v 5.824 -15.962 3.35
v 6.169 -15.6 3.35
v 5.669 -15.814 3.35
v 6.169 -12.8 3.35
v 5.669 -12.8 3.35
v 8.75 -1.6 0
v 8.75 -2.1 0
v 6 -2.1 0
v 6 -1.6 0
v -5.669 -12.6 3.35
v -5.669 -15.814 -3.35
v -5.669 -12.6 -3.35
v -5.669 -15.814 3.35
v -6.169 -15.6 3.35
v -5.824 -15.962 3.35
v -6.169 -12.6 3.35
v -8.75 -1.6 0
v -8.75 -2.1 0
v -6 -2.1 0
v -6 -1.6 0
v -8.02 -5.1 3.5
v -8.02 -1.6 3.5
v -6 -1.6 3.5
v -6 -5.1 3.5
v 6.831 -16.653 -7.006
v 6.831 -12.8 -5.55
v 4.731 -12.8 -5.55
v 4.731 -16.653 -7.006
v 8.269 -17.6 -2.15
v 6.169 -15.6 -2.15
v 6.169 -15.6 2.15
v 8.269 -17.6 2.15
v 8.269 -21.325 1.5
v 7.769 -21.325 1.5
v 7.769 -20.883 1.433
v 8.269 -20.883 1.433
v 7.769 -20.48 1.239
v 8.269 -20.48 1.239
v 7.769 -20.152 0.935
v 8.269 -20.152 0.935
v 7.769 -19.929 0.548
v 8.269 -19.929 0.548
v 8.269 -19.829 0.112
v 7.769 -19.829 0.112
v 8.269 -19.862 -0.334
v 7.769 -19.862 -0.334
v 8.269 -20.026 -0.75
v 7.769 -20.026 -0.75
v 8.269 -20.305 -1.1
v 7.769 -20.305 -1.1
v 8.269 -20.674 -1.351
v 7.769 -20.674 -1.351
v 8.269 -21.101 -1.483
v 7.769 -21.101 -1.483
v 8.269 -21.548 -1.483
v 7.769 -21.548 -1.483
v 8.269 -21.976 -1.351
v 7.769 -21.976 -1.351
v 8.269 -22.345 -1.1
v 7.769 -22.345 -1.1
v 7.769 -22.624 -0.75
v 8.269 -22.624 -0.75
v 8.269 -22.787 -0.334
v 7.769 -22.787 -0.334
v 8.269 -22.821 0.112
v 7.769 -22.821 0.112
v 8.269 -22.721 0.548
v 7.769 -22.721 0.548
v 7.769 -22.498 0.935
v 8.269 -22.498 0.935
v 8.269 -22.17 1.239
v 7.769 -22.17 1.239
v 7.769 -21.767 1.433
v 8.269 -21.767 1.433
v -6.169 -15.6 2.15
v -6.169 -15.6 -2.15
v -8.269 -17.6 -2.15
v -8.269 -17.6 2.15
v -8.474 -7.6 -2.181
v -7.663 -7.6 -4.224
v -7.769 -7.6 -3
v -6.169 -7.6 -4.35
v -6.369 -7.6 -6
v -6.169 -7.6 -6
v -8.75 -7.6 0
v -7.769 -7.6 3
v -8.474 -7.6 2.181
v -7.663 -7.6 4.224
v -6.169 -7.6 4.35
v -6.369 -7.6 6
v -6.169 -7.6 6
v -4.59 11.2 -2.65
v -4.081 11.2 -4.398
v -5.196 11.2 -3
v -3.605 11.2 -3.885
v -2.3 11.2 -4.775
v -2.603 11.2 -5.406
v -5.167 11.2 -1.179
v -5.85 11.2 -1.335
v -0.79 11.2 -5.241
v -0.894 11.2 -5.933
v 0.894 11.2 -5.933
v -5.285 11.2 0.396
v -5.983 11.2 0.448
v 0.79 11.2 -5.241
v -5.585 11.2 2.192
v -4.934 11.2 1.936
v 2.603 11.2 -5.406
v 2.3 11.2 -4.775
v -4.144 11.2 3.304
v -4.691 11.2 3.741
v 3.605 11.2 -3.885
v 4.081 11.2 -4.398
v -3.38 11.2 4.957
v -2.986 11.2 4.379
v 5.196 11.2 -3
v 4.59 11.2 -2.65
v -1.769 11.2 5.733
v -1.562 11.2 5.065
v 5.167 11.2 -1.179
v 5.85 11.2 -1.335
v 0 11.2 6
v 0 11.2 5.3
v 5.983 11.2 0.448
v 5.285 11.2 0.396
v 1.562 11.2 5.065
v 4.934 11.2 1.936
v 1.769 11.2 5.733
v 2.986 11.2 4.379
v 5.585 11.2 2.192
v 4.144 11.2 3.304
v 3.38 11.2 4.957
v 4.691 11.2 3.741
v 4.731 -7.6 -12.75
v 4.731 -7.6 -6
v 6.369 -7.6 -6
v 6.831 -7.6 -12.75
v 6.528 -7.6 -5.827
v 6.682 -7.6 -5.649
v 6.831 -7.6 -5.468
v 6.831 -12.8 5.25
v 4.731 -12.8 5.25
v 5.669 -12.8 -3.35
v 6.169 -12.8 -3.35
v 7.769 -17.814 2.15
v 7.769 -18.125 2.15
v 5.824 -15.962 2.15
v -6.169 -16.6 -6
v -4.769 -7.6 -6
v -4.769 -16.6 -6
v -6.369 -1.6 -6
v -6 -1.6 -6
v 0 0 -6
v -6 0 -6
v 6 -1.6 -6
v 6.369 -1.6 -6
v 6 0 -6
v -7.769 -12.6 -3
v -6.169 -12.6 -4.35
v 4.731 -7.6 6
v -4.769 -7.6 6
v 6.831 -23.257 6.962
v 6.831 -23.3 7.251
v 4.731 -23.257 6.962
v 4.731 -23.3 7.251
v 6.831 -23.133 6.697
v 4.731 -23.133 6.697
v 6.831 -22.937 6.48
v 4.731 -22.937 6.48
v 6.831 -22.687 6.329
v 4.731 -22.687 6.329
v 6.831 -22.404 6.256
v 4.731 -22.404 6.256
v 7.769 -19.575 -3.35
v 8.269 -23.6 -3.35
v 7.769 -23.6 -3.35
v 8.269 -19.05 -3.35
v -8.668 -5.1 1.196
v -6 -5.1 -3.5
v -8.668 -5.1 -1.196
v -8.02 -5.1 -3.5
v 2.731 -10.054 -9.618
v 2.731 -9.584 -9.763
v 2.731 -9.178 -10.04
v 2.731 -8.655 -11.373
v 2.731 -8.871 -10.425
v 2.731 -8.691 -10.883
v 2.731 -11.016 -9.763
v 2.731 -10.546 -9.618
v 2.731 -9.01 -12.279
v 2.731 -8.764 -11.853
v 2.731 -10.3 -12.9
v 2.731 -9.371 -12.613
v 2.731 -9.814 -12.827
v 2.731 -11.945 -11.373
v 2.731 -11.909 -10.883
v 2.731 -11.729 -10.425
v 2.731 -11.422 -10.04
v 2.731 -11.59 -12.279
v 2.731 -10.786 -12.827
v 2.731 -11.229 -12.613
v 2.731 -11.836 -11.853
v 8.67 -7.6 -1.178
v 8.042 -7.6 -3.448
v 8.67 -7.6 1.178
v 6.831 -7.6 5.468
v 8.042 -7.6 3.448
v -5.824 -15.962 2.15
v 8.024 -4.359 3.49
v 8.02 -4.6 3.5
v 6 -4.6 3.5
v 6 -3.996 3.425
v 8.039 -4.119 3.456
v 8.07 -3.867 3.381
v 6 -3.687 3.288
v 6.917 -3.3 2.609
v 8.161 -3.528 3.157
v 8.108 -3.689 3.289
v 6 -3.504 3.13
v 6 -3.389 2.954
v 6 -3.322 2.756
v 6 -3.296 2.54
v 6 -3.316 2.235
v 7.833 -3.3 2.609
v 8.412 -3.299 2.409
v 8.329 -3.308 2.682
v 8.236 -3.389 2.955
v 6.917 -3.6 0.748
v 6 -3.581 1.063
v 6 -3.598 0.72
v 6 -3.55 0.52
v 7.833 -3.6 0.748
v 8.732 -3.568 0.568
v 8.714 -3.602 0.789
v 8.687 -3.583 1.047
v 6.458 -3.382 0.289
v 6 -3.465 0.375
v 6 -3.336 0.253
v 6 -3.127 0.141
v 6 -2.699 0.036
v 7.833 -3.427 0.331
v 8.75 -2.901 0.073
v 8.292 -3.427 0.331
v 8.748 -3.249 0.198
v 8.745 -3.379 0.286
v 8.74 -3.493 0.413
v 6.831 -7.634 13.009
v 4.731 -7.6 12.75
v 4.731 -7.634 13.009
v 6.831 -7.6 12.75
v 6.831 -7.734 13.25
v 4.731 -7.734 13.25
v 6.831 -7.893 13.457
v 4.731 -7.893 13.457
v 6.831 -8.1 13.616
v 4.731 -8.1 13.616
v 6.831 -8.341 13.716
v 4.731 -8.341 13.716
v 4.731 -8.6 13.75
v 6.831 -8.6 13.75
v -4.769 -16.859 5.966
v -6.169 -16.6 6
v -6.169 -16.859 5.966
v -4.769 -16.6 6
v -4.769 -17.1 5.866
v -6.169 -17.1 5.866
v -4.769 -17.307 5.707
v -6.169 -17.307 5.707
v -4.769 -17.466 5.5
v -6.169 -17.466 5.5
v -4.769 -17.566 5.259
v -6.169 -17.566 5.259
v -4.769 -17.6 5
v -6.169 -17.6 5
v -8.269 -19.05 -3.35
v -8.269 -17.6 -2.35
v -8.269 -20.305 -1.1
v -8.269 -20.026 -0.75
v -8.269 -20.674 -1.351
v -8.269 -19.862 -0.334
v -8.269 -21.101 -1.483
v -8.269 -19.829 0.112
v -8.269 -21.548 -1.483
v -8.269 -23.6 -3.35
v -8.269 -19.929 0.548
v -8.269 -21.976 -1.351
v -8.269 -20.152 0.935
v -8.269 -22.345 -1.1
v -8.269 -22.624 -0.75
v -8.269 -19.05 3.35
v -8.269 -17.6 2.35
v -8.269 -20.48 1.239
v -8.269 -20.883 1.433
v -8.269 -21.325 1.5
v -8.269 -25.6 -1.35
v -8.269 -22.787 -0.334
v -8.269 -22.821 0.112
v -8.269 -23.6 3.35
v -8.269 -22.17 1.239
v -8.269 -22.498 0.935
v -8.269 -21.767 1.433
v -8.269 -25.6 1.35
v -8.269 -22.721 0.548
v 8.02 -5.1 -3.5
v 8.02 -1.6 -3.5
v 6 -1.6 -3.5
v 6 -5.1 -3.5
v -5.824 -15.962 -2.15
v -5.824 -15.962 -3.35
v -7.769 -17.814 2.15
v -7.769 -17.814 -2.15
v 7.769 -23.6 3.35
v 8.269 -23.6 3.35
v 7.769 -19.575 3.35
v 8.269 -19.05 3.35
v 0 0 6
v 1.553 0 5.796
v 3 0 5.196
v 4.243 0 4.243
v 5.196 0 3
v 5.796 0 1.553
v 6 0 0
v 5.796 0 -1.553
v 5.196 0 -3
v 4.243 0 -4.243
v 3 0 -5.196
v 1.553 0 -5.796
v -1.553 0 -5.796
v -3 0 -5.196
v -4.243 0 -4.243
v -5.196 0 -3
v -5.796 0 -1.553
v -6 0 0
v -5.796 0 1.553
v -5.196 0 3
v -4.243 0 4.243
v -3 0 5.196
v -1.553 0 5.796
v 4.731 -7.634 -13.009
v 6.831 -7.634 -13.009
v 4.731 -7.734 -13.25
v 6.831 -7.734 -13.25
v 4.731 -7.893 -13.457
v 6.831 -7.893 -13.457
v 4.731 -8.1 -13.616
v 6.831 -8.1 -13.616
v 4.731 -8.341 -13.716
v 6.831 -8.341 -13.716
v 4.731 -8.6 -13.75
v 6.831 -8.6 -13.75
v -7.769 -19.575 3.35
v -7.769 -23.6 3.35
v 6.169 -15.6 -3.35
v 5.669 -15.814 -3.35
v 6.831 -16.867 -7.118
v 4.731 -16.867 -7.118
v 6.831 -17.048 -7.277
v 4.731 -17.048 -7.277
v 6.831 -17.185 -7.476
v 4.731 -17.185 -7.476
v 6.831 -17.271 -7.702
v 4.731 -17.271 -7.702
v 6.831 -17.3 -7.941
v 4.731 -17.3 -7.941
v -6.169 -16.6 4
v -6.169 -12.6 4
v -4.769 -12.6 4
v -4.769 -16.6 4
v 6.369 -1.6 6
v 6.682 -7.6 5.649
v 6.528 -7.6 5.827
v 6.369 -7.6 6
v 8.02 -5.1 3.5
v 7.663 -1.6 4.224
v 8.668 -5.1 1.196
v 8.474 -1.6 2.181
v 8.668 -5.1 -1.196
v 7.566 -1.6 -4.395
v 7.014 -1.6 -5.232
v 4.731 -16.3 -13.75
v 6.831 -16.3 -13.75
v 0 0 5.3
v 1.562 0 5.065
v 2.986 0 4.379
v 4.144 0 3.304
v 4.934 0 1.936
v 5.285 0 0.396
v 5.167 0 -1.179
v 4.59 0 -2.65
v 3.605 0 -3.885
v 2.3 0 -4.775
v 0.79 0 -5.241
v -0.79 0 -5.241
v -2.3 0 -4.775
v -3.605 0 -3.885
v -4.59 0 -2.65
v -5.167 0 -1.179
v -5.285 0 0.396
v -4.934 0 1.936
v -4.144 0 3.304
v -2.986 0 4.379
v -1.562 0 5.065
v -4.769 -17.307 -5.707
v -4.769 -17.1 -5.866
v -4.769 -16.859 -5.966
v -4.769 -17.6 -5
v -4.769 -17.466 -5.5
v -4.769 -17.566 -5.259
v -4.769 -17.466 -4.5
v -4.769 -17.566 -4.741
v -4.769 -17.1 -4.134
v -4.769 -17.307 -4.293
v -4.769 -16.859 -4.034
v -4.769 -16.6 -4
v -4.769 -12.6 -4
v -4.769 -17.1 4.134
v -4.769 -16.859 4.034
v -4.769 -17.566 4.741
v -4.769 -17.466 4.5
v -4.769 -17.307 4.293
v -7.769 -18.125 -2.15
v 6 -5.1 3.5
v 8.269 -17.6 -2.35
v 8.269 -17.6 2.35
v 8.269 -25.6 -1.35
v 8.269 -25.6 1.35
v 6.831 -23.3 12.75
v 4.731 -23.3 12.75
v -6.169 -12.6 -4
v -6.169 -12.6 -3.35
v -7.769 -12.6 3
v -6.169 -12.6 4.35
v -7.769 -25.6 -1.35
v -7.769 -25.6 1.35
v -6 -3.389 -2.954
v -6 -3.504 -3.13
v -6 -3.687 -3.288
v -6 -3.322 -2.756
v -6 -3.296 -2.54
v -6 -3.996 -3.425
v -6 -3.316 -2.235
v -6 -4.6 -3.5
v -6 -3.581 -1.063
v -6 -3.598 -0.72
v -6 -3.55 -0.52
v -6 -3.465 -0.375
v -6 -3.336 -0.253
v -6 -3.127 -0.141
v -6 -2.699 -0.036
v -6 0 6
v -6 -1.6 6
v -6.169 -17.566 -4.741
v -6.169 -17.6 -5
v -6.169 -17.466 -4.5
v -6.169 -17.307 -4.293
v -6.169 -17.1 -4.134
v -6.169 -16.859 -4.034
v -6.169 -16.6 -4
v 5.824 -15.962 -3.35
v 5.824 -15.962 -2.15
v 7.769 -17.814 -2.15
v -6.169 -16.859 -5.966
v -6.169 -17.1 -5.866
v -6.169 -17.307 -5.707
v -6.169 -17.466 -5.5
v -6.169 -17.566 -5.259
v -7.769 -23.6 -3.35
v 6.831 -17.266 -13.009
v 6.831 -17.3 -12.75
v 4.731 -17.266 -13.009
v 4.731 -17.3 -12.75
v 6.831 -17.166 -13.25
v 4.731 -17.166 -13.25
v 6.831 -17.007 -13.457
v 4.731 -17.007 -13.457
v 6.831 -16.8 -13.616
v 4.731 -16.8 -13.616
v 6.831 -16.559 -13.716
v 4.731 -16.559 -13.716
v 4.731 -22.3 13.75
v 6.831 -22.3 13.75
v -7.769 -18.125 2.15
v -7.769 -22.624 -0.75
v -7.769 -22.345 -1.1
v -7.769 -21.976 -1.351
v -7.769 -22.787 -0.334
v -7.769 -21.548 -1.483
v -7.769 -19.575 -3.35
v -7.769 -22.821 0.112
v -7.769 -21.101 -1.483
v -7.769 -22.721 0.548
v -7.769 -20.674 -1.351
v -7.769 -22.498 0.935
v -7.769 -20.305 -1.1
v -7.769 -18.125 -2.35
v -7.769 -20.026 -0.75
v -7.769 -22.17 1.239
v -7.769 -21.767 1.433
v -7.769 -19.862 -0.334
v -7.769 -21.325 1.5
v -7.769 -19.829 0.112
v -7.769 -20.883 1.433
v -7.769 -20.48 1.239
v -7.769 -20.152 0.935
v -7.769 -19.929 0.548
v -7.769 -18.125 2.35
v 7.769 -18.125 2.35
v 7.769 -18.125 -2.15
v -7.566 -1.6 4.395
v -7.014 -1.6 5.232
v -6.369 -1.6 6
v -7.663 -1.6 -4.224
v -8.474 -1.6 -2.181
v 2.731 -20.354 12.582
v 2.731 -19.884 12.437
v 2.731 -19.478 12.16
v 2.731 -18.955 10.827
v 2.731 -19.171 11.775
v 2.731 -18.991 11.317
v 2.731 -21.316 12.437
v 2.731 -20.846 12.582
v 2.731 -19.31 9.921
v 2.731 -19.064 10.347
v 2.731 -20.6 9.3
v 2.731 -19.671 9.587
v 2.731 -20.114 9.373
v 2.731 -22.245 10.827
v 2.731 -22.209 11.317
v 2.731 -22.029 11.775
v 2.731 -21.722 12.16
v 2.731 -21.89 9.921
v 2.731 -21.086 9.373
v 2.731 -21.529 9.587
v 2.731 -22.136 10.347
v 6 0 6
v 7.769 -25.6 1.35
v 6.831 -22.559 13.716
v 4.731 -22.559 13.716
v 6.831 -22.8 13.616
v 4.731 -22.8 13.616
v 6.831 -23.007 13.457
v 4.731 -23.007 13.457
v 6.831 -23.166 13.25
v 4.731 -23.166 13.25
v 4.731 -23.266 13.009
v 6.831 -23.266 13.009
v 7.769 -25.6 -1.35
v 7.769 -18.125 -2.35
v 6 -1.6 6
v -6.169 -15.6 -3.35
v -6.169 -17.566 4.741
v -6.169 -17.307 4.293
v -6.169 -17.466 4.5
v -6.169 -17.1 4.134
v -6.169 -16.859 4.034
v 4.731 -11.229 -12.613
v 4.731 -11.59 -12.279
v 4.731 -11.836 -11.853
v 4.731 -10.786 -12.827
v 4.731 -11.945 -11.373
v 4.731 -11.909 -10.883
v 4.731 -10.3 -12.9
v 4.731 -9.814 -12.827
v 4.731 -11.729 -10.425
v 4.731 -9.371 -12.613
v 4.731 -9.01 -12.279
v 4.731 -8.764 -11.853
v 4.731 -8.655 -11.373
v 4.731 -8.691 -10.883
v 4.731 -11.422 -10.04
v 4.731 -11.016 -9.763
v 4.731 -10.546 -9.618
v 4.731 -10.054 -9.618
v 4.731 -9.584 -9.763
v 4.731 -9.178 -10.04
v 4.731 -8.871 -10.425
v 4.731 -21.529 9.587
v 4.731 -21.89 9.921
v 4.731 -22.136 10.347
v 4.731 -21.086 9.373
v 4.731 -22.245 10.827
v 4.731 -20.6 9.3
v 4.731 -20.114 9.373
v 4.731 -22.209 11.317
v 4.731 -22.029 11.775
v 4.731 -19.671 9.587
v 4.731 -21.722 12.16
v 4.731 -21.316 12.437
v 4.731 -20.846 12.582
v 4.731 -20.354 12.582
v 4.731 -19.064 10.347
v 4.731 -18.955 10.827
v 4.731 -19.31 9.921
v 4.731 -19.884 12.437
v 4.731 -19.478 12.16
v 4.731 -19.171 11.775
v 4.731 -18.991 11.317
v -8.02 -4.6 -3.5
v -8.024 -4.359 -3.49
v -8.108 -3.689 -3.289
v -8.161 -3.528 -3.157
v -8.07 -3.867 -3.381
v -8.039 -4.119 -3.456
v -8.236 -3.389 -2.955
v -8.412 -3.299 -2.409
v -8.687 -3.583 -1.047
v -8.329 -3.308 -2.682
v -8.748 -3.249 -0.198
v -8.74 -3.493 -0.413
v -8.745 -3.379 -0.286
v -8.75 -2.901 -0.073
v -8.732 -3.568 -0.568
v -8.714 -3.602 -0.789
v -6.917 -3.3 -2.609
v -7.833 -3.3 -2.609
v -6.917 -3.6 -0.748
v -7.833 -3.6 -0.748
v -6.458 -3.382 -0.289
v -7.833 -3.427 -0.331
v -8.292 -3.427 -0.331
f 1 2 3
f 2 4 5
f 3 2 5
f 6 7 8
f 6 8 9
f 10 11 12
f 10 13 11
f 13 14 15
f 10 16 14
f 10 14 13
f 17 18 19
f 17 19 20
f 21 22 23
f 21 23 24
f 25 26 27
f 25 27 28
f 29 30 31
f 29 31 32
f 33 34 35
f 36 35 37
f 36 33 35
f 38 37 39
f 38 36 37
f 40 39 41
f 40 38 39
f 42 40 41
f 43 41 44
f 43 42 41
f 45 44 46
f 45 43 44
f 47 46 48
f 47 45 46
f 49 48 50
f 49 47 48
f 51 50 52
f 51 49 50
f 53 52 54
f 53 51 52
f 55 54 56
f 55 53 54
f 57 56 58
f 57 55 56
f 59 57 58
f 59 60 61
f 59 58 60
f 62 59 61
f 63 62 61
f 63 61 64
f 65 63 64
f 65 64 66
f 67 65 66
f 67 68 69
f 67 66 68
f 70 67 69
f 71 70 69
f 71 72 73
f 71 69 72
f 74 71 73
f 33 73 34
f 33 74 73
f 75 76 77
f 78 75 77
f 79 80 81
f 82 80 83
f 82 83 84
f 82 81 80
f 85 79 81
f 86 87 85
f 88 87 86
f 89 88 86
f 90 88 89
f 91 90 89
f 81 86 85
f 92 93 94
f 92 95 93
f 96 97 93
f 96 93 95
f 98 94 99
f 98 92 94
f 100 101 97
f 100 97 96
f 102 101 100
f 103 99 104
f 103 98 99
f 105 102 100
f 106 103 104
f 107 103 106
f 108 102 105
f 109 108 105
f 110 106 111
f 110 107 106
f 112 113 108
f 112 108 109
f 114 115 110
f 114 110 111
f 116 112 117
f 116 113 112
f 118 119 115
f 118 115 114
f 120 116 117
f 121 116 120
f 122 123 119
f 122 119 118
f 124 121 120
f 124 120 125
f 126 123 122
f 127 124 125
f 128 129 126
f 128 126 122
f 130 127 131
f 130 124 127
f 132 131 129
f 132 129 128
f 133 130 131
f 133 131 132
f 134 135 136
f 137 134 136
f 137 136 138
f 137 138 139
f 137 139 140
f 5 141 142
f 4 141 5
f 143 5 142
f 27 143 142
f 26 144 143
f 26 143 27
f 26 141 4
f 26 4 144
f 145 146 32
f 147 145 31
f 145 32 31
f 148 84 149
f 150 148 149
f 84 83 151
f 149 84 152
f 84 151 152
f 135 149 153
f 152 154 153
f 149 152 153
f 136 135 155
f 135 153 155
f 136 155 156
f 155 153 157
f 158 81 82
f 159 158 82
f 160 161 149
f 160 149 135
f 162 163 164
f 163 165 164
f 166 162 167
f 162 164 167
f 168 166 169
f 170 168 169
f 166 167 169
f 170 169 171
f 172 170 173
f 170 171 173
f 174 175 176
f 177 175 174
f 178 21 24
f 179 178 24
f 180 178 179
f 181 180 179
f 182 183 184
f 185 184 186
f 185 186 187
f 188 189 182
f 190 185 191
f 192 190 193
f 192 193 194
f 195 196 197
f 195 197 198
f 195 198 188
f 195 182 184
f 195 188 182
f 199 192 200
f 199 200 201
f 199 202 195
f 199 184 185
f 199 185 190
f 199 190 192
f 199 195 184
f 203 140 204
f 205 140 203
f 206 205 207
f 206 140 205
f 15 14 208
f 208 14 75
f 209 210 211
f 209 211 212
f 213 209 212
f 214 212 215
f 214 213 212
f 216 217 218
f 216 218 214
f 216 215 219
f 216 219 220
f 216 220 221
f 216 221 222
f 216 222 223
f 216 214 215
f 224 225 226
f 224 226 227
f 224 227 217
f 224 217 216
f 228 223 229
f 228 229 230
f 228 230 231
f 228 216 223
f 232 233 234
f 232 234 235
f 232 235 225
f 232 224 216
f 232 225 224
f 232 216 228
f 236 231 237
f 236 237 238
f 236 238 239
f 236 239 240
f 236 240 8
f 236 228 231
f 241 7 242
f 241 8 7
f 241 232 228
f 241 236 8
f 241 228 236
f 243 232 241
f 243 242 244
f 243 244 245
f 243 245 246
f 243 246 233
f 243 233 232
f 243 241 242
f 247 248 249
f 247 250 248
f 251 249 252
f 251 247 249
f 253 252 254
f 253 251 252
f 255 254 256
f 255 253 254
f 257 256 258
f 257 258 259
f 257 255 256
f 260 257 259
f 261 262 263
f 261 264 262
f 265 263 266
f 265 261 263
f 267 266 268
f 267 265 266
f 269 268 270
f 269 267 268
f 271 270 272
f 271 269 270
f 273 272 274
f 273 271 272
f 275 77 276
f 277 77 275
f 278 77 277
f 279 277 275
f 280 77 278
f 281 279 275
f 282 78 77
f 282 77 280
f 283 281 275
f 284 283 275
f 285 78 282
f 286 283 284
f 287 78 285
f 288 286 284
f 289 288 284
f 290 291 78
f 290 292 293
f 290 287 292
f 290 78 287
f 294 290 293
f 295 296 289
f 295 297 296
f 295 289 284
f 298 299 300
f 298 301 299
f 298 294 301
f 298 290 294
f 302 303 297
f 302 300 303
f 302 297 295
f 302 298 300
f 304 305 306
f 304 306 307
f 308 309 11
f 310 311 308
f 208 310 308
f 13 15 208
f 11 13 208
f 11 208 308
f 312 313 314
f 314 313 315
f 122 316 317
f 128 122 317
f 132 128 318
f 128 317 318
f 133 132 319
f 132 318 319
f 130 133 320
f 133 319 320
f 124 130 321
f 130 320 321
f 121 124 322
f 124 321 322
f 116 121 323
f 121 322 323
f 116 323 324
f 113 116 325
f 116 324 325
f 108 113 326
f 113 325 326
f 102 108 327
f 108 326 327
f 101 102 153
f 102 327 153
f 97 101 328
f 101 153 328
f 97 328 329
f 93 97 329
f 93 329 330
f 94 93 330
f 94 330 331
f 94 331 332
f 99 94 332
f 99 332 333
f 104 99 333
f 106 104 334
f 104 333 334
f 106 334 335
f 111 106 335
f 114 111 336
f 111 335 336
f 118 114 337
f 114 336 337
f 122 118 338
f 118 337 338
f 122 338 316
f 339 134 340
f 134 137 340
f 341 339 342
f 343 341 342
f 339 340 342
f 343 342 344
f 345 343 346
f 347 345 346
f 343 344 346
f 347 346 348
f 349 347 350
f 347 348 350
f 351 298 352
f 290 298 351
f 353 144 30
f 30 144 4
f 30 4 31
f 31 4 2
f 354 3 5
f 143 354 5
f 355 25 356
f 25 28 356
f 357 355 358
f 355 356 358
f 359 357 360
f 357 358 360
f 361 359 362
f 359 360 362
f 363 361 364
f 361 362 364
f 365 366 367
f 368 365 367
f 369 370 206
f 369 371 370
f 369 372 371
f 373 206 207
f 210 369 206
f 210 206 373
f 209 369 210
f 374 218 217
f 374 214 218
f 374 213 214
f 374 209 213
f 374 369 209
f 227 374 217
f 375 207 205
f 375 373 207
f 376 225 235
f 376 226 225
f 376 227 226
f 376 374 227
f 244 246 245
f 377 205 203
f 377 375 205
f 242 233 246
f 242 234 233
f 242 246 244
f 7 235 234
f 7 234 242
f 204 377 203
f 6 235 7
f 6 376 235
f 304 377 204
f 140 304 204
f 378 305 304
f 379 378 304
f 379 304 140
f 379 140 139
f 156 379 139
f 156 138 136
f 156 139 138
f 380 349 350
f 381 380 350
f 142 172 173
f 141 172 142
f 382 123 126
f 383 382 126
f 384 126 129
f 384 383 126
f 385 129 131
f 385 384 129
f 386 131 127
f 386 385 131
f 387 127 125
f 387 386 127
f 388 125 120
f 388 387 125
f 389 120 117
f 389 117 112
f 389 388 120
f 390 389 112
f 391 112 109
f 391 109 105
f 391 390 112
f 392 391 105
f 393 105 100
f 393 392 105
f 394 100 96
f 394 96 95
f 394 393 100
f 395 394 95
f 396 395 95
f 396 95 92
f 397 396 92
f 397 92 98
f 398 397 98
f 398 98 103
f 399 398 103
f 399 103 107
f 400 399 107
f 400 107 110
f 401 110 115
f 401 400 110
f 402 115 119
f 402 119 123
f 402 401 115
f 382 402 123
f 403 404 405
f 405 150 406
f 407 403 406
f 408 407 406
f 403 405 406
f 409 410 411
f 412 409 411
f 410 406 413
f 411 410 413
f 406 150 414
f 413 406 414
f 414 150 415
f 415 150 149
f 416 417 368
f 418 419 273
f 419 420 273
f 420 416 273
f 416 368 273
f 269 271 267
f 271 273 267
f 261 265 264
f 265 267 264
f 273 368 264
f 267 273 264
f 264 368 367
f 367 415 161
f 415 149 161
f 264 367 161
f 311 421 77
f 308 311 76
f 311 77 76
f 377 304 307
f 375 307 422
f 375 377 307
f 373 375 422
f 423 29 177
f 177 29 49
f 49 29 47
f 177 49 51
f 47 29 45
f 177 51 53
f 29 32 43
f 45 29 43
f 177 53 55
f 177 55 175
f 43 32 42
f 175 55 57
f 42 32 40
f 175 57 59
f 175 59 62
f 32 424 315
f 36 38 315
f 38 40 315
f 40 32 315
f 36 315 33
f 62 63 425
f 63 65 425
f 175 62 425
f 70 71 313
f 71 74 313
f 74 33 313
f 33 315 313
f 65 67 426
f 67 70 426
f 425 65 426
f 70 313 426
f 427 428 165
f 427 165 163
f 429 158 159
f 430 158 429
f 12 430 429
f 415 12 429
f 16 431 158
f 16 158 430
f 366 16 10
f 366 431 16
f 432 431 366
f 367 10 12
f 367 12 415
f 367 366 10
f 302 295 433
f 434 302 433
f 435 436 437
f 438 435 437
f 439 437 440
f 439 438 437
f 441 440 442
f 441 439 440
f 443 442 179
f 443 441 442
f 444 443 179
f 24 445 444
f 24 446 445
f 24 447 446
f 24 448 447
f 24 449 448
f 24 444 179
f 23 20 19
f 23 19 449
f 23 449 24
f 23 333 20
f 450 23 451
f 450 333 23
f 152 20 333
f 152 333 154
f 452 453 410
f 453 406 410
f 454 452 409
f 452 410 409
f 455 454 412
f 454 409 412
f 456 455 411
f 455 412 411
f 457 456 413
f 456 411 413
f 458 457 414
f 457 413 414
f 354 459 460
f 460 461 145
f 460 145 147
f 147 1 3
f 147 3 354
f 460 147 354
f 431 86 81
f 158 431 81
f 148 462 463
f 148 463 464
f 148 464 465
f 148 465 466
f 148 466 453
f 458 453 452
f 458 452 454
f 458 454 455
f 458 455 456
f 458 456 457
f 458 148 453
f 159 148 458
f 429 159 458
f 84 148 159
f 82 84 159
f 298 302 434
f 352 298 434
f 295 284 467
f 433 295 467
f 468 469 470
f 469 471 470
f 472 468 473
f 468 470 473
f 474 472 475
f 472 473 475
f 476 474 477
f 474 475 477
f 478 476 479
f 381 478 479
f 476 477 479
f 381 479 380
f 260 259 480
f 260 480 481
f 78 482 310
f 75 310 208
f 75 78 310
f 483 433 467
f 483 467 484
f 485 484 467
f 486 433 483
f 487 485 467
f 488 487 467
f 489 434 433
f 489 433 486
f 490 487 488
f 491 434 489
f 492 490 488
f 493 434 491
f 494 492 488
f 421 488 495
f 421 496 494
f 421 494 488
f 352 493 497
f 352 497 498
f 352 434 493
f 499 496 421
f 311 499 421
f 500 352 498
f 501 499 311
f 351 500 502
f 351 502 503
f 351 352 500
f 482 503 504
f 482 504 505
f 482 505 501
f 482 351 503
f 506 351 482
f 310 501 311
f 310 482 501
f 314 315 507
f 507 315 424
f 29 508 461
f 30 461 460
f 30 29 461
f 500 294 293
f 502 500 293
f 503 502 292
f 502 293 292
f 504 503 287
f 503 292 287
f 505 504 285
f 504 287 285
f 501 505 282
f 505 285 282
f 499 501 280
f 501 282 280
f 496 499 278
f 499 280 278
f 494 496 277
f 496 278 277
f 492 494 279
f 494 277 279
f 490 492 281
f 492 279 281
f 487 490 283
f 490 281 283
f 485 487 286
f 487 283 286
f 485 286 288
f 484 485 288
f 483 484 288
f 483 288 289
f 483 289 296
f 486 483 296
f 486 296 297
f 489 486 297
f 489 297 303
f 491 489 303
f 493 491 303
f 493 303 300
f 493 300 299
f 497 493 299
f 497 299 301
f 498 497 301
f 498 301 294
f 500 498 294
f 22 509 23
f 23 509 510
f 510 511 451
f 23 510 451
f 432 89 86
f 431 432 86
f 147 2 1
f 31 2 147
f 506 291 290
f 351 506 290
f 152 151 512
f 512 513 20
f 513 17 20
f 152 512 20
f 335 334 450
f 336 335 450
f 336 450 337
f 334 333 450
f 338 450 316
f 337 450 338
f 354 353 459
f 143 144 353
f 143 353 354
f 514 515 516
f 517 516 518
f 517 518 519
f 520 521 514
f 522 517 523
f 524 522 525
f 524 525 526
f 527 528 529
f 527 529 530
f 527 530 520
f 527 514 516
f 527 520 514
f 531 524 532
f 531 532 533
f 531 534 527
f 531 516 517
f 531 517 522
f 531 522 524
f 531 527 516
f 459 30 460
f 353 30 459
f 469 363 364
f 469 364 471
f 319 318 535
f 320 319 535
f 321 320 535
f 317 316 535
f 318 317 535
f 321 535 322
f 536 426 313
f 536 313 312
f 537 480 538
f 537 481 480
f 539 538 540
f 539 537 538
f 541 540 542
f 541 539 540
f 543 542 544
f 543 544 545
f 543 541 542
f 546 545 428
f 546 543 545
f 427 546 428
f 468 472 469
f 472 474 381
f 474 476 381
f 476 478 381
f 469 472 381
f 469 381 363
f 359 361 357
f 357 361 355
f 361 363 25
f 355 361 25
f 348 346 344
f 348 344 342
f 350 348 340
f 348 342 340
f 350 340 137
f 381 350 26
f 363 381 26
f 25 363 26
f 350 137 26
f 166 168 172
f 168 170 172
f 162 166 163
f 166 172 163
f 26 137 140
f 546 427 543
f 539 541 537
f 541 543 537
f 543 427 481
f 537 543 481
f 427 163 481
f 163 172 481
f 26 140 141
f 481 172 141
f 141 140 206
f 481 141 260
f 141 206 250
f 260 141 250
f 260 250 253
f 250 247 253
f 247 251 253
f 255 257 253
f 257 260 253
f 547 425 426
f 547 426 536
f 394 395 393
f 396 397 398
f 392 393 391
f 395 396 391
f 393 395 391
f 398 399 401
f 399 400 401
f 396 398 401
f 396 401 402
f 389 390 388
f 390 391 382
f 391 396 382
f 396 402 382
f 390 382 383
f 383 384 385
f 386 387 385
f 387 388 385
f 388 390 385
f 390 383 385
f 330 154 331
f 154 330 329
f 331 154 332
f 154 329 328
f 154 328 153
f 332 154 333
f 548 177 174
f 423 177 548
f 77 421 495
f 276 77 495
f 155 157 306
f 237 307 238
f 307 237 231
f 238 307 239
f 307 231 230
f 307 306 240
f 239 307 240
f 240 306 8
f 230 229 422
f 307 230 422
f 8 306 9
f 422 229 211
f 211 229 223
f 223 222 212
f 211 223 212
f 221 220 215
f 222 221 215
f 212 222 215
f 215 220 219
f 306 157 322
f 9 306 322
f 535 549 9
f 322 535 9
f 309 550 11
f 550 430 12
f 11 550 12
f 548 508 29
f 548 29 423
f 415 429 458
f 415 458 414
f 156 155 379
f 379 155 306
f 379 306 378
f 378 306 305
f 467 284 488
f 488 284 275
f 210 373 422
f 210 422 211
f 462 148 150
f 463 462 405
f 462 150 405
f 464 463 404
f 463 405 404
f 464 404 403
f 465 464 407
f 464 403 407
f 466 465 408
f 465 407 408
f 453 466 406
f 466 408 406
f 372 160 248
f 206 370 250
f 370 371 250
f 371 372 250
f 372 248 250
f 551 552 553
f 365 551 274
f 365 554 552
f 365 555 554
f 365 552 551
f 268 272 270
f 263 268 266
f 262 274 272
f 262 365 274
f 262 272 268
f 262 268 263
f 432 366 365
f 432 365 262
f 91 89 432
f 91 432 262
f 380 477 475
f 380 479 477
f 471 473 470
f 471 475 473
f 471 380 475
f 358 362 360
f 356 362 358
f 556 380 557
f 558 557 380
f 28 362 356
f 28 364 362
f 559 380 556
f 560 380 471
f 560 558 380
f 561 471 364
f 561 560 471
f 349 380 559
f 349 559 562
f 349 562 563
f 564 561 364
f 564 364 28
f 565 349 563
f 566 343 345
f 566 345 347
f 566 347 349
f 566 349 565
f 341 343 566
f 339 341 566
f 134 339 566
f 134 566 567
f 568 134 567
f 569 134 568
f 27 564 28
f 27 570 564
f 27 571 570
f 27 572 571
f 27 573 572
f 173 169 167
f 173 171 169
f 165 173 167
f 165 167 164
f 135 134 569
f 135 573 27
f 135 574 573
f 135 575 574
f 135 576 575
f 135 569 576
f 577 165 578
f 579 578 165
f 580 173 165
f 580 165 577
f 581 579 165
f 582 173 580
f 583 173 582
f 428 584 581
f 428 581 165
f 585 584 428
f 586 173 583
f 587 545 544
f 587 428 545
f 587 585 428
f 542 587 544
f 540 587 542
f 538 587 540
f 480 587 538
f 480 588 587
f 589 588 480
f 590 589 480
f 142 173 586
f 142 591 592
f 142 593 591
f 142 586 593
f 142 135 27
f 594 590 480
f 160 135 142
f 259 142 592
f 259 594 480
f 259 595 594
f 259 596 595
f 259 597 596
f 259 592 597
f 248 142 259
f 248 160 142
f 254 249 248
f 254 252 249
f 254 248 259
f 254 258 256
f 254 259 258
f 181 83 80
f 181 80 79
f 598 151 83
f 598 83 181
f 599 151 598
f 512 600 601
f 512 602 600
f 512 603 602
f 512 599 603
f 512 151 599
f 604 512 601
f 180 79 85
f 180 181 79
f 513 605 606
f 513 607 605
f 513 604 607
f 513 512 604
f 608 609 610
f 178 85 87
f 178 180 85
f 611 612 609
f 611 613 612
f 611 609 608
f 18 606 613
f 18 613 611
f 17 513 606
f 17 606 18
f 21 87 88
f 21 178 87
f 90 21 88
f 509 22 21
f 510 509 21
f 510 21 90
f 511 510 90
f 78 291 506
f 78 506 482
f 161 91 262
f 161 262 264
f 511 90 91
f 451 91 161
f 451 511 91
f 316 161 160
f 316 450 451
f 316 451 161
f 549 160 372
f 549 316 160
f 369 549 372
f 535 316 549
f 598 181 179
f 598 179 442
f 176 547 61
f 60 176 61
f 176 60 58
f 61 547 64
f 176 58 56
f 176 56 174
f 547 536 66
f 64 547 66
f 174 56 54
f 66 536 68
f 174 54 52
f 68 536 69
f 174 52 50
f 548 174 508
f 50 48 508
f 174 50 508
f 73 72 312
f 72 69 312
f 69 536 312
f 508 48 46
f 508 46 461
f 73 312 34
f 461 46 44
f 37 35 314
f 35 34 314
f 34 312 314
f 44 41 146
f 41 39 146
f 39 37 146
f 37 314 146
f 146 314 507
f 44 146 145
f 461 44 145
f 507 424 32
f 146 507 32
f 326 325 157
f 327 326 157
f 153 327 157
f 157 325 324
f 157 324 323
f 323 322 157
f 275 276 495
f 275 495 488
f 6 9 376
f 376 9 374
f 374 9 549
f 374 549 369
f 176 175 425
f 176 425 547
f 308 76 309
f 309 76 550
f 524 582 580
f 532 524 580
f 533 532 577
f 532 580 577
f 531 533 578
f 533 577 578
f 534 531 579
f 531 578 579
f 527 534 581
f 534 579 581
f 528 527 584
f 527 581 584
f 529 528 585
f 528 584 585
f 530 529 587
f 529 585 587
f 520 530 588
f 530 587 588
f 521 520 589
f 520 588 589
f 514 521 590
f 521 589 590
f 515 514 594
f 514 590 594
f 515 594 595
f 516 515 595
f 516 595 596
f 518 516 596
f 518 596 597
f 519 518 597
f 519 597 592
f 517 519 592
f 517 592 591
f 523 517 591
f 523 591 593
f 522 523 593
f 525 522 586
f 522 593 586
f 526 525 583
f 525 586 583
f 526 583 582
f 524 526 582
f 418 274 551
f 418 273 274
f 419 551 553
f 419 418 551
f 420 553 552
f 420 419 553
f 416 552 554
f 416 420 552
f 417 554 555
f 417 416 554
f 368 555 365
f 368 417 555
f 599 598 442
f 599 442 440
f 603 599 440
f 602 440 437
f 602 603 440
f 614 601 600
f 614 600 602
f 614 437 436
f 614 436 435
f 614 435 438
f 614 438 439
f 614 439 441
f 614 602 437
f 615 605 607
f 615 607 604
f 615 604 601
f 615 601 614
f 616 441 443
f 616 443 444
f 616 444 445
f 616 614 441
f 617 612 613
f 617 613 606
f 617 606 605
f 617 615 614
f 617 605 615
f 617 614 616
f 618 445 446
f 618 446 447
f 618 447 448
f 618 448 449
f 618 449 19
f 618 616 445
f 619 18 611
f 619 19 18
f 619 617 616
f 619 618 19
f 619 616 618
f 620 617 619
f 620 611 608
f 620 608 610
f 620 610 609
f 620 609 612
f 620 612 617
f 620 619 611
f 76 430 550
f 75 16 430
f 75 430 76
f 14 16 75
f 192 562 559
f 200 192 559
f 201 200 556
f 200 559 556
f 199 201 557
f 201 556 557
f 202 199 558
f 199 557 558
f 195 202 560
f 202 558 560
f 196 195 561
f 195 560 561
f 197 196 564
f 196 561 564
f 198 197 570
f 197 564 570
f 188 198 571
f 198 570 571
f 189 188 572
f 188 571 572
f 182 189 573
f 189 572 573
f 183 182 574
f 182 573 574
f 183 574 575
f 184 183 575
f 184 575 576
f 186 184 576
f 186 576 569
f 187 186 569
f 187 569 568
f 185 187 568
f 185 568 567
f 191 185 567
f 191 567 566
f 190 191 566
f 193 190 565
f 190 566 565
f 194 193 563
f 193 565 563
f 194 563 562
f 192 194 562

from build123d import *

# Parameters (mm, degrees)
SKETCH1_R                = 6
SKETCH1_R_2              = 5.3
BOSS_EXTRUDE1_DEPTH      = 11.2
SKETCH2_W                = 12
SKETCH2_H                = 12
BOSS_EXTRUDE2_DEPTH      = 1.6
SKETCH3_W                = 17.5
SKETCH3_H                = 12
BOSS_EXTRUDE3_DEPTH      = 6
CUT_EXTRUDE1_DEPTH       = 2.75
CIRPATTERN8_COUNT        = 2
SKETCH5_OUTSIDE_W        = 25.17
SKETCH5_OUTSIDE_H        = 19.67
SKETCH5_OUTSIDE_R        = 8.75
CUT_EXTRUDE2_DEPTH       = 22.587091205
BOSS_EXTRUDE4_DEPTH      = 5
SKETCH7_W                = 1.4
SKETCH7_H                = 2
BOSS_EXTRUDE5_DEPTH      = 5
SKETCH8_W                = 2.1
SKETCH8_H                = 27.5
BOSS_EXTRUDE6_DEPTH      = 15.7
CUT_EXTRUDE3_DEPTH       = 3
FILLET1_R                = 1
BOSS_EXTRUDE7_DEPTH      = 3.35
SKETCH12_W               = 2.9
SKETCH12_H               = 1.2
CUT_EXTRUDE4_DEPTH       = 6.7
CHAMFER1_SIZE            = 1
CHAMFER2_SIZE            = 2
SKETCH13_R               = 1.5
CUT_EXTRUDE5_DEPTH       = 6.7
CHAMFER1_OF_MIRROR3_SIZE = 1
CHAMFER2_OF_MIRROR3_SIZE = 2
SKETCH14_R               = 1.65
BOSS_EXTRUDE8_DEPTH      = 2


# Some blends are built 0.0001 mm under size
with BuildPart() as part:
    # Sketch1 → Boss-Extrude1 (new body)
    with BuildSketch(Plane(origin=(0, 0, 0), x_dir=(1, 0, 0), z_dir=(0, 1, 0))):
        with Locations(Location((0, 0, 0), (0, 0, 270))):
            Circle(SKETCH1_R)
        with Locations(Location((0, 0, 0), (0, 0, 270))):
            Circle(SKETCH1_R_2, mode=Mode.SUBTRACT)
    extrude(amount=BOSS_EXTRUDE1_DEPTH)

    # Sketch2 → Boss-Extrude2 (add)
    with BuildSketch(Plane.XZ):
        Rectangle(SKETCH2_W, SKETCH2_H)
    extrude(amount=BOSS_EXTRUDE2_DEPTH)

    # Sketch3 → Boss-Extrude3 (add)
    with BuildSketch(Plane.XZ.offset(1.6)):
        Rectangle(SKETCH3_W, SKETCH3_H)
    extrude(amount=BOSS_EXTRUDE3_DEPTH)

    # Sketch4 → Cut-Extrude1 (cut)
    with BuildSketch(Plane.ZY.offset(8.75)):
        with BuildLine():
            Line((3.5, -1.6), (3.5, -5.1))
            Line((3.5, -5.1), (-3.5, -5.1))
            Line((-3.5, -5.1), (-3.5, -4.6))
            add(Edge.make_bspline(
                [(-3.5, -4.6), (-3.5, -3.681946605), (-2.636311327, -2.93147779), (-0.605865115, -3.976002744), (0, -3.206492633), (0, -2.1)],
                knots=[0, 0, 0, 0, 0.306820438, 0.673720389, 1, 1, 1, 1], degree=3))
            Line((0, -2.1), (0, -1.6))
            Line((0, -1.6), (3.5, -1.6))
        make_face()
    cut_extrude1 = extrude(amount=-CUT_EXTRUDE1_DEPTH, mode=Mode.SUBTRACT)

    # CirPattern8: Cut-Extrude1 ×2 about axis
    cirpattern8_axis = Axis((0, 11.2, 0), (0, -1, 0))
    for i in range(1, CIRPATTERN8_COUNT):
        add(cut_extrude1.rotate(cirpattern8_axis, i * 360 / CIRPATTERN8_COUNT), mode=Mode.SUBTRACT)

    # Sketch5 outside → Cut-Extrude2 (cut, through all)
    with BuildSketch(Plane(origin=(0, 11.2, 0), x_dir=(1, 0, 0), z_dir=(0, 1, 0))):
        Rectangle(SKETCH5_OUTSIDE_W, SKETCH5_OUTSIDE_H)
        Circle(SKETCH5_OUTSIDE_R, mode=Mode.SUBTRACT)
    extrude(amount=-CUT_EXTRUDE2_DEPTH, mode=Mode.SUBTRACT)

    # Sketch6 → Boss-Extrude4 (add)
    with BuildSketch(Plane.XZ.offset(7.6)):
        Polygon((-6.168869601, -4.35), (-6.168869601, 4.35), (-7.768869601, 3), (-7.768869601, -3), align=None)
        Polygon((-4.768869601, -6), (-4.768869601, 6), (-6.168869601, 6), (-6.168869601, 4.35), (-6.168869601, -4.35), (-6.168869601, -6), align=None)
    extrude(amount=BOSS_EXTRUDE4_DEPTH)

    # Sketch7 → Boss-Extrude5 (add)
    with BuildSketch(Plane.XZ.offset(12.6)):
        with Locations((-5.468869601, 5)):
            Rectangle(SKETCH7_W, SKETCH7_H)
        with Locations((-5.468869601, -5)):
            Rectangle(SKETCH7_W, SKETCH7_H)
    extrude(amount=BOSS_EXTRUDE5_DEPTH)

    # Sketch8 → Boss-Extrude6 (add)
    with BuildSketch(Plane.XZ.offset(7.6)):
        with Locations((5.781130399, 0)):
            Rectangle(SKETCH8_W, SKETCH8_H)
    extrude(amount=BOSS_EXTRUDE6_DEPTH)

    # Sketch9 → Cut-Extrude3 (cut)
    with BuildSketch(Plane(origin=(6.831130399, 0, 0), x_dir=(0, 0, -1), z_dir=(1, 0, 0))):
        Polygon((-6.35, -23.3), (-5.25, -12.8), (5.55, -12.8), (7.25, -17.3), (13.75, -17.3), (13.75, -23.3), align=None)
    extrude(amount=-CUT_EXTRUDE3_DEPTH, mode=Mode.SUBTRACT)

    # Fillet1
    fillet1_edges = [part.edges().sort_by_distance(p)[0] for p in [
        (5.781130399, -7.6, 13.75),
        (5.781130399, -7.6, -13.75),
        (-5.468869601, -17.6, -6),
        (-5.468869601, -17.6, -4),
        (-5.468869601, -17.6, 6),
        (-5.468869601, -17.6, 4),
        (5.781130399, -23.3, 13.75),
        (5.781130399, -23.3, 6.35),
        (5.781130399, -17.3, -7.25),
        (5.781130399, -17.3, -13.75),
    ]]
    fillet(fillet1_edges, radius=FILLET1_R - 0.0001)  # a hair under: the kernel refuses the full size

    # Sketch11 → Boss-Extrude7 (add, symmetric)
    with BuildSketch(Plane.XY):
        Polygon((-6.168869601, -12.6), (-6.168869601, -15.599847371), (-8.268869601, -17.599847371), (-8.268869601, -25.599847371), (-7.768869601, -25.599847371), (-7.768869601, -17.814133086), (-5.668869601, -15.814133086), (-5.668869601, -12.6), align=None)
    boss_extrude7 = extrude(amount=BOSS_EXTRUDE7_DEPTH, both=True)

    # Sketch12 → Cut-Extrude4 (cut)
    with BuildSketch(Plane(origin=(4.856585084, -5.099414338, 0), x_dir=(0.7241379310344822, 0.6896551724137937, 0), z_dir=(-0.6896551724137937, 0.7241379310344822, 0))):
        with Locations((-16.675627899, 2.75)):
            Rectangle(SKETCH12_W, SKETCH12_H)
        with Locations((-16.675627899, -2.75)):
            Rectangle(SKETCH12_W, SKETCH12_H)
    cut_extrude4 = extrude(amount=-CUT_EXTRUDE4_DEPTH, mode=Mode.SUBTRACT)

    # Chamfer1
    # the kernel refuses this chamfer: 1 mm, written as the material it takes off along each edge
    with BuildSketch(Plane(origin=(-10.042444076, -15.737594173, -3.35), x_dir=(0.019910807200768887, 0.018962673524541826, 0.9996219169112968), z_dir=(0.6896551724137937, -0.7241379310344822, 0))) as chamfer1_piece_1:
        Polygon((CHAMFER1_SIZE * 0.999621916911, CHAMFER1_SIZE * 0.0274958766106), (-CHAMFER1_SIZE * 0.0274958766106, CHAMFER1_SIZE * 0.999621916911), (0, 0), align=None)
    extrude(amount=5.868365976, mode=Mode.SUBTRACT)
    with BuildSketch(Plane(origin=(-10.042444076, -15.737594173, 3.35), x_dir=(0.019910807200768887, 0.018962673524541826, -0.9996219169112968), z_dir=(0.6896551724137937, -0.7241379310344822, 0))) as chamfer1_piece_2:
        Polygon((CHAMFER1_SIZE * 0.999621916911, -CHAMFER1_SIZE * 0.0274958766106), (-CHAMFER1_SIZE * 0.0274958766106, -CHAMFER1_SIZE * 0.999621916911), (0, 0), align=None)
    extrude(amount=5.868365976, mode=Mode.SUBTRACT)

    # Chamfer2
    chamfer2_edges = [part.edges().sort_by_distance(p)[0] for p in [
        (-8.018869601, -25.599847371, -3.35),
        (-8.018869601, -25.599847371, 3.35),
    ]]
    chamfer(chamfer2_edges, length=CHAMFER2_SIZE)

    # Sketch13 → Cut-Extrude5 (cut)
    with BuildSketch(Plane.ZY.offset(8.268869601)):
        with Locations((0, -21.324847371)):
            Circle(SKETCH13_R)
    cut_extrude5 = extrude(amount=-CUT_EXTRUDE5_DEPTH, mode=Mode.SUBTRACT)

    # Mirror3: Boss-Extrude7, Cut-Extrude4, Cut-Extrude5 across plane
    add(boss_extrude7.mirror(Plane(origin=(0, 0, 0), x_dir=(0, 0, 1), z_dir=(1, 0, 0))))
    add(cut_extrude4.mirror(Plane(origin=(0, 0, 0), x_dir=(0, 0, 1), z_dir=(1, 0, 0))), mode=Mode.SUBTRACT)
    add(cut_extrude5.mirror(Plane(origin=(0, 0, 0), x_dir=(0, 0, 1), z_dir=(1, 0, 0))), mode=Mode.SUBTRACT)

    # Chamfer1 of Mirror3
    # the kernel refuses this chamfer: 1 mm, written as the material it takes off along each edge
    with BuildSketch(Plane(origin=(10.042444076, -15.737594173, -3.35), x_dir=(0.7238641467288695, -0.6893944254560673, -0.02749587661058651), z_dir=(-0.6896551724137937, -0.7241379310344822, 0))) as chamfer1_of_mirror3_piece_1:
        Polygon((CHAMFER1_OF_MIRROR3_SIZE * 0.999621916911, CHAMFER1_OF_MIRROR3_SIZE * 0.0274958766106), (-CHAMFER1_OF_MIRROR3_SIZE * 0.0274958766106, CHAMFER1_OF_MIRROR3_SIZE * 0.999621916911), (0, 0), align=None)
    extrude(amount=5.868365976, mode=Mode.SUBTRACT)
    with BuildSketch(Plane(origin=(10.042444076, -15.737594173, 3.35), x_dir=(0.7238641467288695, -0.6893944254560673, 0.02749587661058651), z_dir=(-0.6896551724137937, -0.7241379310344822, 0))) as chamfer1_of_mirror3_piece_2:
        Polygon((CHAMFER1_OF_MIRROR3_SIZE * 0.999621916911, -CHAMFER1_OF_MIRROR3_SIZE * 0.0274958766106), (-CHAMFER1_OF_MIRROR3_SIZE * 0.0274958766106, -CHAMFER1_OF_MIRROR3_SIZE * 0.999621916911), (0, 0), align=None)
    extrude(amount=5.868365976, mode=Mode.SUBTRACT)

    # Chamfer2 of Mirror3
    chamfer2_of_mirror3_edges = [part.edges().sort_by_distance(p)[0] for p in [
        (8.018869601, -25.599847371, -3.35),
        (8.018869601, -25.599847371, 3.35),
    ]]
    chamfer(chamfer2_of_mirror3_edges, length=CHAMFER2_OF_MIRROR3_SIZE)

    # Sketch14 → Boss-Extrude8 (add)
    with BuildSketch(Plane.ZY.offset(-4.731130399)):
        with Locations(Location((-11.25, -10.3, 0), (0, 0, 180))):
            Circle(SKETCH14_R)
        with Locations(Location((10.95, -20.6, 0), (0, 0, 180))):
            Circle(SKETCH14_R)
    extrude(amount=BOSS_EXTRUDE8_DEPTH)


solid = part.part
